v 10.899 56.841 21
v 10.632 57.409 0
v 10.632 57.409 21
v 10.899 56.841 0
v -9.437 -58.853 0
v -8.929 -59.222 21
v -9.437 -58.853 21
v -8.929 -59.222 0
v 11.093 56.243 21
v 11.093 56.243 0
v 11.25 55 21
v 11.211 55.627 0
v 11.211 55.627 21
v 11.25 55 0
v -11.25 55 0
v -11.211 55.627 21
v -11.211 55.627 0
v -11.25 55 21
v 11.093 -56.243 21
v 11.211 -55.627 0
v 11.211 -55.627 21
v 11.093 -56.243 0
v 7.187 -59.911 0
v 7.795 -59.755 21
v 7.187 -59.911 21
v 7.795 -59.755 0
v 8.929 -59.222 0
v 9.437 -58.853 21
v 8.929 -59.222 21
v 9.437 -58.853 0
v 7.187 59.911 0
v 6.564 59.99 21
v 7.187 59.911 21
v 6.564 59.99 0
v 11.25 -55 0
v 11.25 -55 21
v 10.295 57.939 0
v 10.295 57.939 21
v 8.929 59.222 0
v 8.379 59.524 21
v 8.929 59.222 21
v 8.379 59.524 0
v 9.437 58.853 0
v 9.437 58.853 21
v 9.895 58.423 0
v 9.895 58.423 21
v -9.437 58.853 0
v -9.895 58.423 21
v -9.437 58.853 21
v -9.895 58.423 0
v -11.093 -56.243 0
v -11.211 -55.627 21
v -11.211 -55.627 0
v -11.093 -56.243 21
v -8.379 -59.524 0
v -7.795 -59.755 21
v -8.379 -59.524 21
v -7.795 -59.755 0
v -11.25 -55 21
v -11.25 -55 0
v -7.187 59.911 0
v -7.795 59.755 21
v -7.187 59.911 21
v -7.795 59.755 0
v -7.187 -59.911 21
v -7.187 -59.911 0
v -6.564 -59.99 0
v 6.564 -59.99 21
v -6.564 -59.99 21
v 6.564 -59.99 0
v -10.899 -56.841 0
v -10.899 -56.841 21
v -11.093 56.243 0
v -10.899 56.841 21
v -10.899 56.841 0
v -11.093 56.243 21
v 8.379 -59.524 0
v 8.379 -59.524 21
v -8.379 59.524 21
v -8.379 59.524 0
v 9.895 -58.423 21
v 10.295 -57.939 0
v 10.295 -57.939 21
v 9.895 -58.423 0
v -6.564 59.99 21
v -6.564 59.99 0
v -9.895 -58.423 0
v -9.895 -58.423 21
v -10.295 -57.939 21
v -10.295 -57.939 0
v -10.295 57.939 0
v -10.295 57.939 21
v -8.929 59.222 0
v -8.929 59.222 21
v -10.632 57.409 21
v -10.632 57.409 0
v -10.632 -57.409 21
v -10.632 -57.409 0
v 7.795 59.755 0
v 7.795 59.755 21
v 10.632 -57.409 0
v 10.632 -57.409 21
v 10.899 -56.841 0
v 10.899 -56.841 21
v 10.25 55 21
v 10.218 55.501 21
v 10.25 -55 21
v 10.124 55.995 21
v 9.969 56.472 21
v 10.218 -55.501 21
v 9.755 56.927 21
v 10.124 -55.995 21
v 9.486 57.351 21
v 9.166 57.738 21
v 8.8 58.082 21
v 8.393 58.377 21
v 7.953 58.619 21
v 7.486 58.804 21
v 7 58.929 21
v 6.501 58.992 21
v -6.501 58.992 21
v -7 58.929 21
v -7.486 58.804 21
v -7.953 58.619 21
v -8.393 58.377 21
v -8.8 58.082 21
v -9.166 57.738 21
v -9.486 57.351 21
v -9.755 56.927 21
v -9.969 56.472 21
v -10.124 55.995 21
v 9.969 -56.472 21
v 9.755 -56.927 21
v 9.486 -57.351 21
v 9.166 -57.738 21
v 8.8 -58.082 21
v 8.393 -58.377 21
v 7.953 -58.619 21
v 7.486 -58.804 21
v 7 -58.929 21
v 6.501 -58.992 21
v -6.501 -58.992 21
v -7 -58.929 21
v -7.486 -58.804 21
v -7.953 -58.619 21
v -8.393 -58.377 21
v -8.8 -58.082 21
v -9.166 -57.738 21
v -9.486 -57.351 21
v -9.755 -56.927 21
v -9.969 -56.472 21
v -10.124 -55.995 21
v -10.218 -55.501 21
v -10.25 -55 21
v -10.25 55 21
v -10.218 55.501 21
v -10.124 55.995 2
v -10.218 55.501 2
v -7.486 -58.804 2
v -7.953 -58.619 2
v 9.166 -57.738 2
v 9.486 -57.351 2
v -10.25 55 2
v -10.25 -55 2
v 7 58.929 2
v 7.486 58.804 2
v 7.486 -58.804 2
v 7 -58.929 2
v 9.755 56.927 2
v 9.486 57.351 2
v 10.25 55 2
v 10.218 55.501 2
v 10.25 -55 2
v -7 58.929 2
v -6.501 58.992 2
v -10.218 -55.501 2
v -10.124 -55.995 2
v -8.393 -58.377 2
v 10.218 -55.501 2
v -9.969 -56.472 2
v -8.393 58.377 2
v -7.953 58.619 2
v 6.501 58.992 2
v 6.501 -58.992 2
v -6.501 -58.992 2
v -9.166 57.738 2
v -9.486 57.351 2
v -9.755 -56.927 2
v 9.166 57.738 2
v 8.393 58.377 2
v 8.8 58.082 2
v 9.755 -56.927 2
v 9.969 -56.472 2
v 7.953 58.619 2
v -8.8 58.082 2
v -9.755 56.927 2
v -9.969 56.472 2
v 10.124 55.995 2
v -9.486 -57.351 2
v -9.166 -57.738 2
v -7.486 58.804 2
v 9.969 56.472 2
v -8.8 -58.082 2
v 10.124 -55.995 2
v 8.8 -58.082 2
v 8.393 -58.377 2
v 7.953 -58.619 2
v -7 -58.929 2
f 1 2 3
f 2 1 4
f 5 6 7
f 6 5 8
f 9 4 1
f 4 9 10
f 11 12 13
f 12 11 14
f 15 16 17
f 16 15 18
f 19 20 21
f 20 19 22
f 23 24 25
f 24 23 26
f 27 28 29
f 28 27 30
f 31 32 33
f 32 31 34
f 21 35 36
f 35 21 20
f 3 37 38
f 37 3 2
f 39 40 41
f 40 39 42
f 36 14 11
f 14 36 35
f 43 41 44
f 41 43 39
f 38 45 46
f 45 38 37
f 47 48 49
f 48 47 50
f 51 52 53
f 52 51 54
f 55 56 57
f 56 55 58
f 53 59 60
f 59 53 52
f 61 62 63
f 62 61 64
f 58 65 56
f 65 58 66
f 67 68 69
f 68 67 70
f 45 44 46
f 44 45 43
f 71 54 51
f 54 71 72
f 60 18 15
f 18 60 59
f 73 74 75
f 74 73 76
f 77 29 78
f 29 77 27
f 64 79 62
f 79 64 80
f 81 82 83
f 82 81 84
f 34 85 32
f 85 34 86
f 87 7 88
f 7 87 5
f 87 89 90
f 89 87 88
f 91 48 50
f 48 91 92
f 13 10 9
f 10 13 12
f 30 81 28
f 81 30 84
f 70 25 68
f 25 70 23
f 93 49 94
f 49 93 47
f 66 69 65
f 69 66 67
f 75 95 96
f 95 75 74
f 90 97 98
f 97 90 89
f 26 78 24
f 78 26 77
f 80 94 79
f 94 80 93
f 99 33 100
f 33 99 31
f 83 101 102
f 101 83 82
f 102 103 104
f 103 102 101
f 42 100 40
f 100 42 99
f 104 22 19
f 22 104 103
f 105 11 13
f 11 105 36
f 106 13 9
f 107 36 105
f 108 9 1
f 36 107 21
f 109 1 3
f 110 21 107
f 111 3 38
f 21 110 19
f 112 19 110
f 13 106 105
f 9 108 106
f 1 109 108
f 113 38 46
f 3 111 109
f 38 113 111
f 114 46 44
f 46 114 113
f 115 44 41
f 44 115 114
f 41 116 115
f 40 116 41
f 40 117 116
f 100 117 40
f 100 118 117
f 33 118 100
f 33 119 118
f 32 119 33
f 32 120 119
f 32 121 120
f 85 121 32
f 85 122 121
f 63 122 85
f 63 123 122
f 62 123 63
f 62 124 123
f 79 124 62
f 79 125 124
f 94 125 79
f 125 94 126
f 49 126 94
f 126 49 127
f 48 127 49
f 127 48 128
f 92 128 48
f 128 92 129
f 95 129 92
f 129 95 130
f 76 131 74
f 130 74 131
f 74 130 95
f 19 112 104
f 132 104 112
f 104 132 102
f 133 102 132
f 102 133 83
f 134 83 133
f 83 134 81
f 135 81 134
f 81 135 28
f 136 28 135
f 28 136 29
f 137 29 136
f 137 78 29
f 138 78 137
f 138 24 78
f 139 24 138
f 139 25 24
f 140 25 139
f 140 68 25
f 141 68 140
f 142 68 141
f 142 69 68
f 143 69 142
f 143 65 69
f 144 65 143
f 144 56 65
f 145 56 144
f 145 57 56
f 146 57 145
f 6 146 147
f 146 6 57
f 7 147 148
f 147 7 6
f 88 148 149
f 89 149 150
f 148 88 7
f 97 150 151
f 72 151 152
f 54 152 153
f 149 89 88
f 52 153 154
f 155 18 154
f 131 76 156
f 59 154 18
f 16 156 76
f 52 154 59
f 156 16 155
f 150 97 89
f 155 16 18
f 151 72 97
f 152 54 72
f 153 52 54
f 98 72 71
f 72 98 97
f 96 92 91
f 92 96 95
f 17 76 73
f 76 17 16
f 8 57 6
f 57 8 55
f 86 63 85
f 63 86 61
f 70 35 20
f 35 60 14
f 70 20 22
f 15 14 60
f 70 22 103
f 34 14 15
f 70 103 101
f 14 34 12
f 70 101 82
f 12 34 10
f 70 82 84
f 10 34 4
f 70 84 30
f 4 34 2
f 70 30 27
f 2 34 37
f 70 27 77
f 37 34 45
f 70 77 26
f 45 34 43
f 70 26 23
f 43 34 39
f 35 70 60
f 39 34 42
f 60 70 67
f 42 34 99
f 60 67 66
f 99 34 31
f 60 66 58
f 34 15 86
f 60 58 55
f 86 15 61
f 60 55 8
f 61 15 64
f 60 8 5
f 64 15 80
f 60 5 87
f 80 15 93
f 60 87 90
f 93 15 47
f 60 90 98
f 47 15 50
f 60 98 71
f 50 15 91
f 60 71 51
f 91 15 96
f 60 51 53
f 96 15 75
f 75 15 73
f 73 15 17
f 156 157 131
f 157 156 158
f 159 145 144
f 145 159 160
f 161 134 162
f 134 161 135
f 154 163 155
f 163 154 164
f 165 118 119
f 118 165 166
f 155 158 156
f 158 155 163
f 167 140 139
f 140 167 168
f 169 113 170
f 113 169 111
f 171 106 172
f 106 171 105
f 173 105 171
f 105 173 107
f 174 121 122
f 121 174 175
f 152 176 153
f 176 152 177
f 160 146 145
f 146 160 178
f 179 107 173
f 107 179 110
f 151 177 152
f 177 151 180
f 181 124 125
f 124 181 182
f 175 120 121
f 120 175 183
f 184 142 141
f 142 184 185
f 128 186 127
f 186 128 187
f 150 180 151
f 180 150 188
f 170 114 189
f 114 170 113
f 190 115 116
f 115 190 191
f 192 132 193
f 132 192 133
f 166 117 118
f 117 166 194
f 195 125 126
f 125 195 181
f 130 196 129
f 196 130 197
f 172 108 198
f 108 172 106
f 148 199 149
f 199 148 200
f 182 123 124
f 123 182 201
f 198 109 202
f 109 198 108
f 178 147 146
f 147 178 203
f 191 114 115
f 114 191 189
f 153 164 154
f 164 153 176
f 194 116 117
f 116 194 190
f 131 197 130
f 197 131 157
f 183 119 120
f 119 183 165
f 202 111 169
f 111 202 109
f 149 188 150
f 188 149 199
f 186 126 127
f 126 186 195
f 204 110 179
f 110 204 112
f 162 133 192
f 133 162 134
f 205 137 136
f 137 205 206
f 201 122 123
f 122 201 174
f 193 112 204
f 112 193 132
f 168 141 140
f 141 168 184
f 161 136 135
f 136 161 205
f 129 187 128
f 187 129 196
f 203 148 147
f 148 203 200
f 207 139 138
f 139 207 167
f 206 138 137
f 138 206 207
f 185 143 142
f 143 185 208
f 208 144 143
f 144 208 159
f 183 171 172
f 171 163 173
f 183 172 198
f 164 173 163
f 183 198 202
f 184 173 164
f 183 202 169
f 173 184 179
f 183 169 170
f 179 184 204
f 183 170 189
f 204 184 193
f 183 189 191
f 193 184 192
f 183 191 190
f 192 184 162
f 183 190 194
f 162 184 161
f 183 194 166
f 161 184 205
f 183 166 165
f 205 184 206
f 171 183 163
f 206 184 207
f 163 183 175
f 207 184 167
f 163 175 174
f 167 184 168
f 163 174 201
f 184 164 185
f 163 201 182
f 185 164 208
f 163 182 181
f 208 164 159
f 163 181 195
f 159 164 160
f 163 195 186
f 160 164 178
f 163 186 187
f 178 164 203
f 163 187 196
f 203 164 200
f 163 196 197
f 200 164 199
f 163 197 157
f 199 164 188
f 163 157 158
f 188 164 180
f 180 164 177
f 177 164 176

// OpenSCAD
$fn = 50;


difference() {
	union() {
		hull() {
			translate(v = [-6.2500000000, 55.0000000000, 0]) {
				cylinder(h = 21, r = 5);
			}
			translate(v = [6.2500000000, 55.0000000000, 0]) {
				cylinder(h = 21, r = 5);
			}
			translate(v = [-6.2500000000, -55.0000000000, 0]) {
				cylinder(h = 21, r = 5);
			}
			translate(v = [6.2500000000, -55.0000000000, 0]) {
				cylinder(h = 21, r = 5);
			}
		}
	}
	union() {
		translate(v = [0, 0, 2]) {
			hull() {
				translate(v = [-6.2500000000, 55.0000000000, 0]) {
					cylinder(h = 19, r = 4);
				}
				translate(v = [6.2500000000, 55.0000000000, 0]) {
					cylinder(h = 19, r = 4);
				}
				translate(v = [-6.2500000000, -55.0000000000, 0]) {
					cylinder(h = 19, r = 4);
				}
				translate(v = [6.2500000000, -55.0000000000, 0]) {
					cylinder(h = 19, r = 4);
				}
			}
		}
	}
}
